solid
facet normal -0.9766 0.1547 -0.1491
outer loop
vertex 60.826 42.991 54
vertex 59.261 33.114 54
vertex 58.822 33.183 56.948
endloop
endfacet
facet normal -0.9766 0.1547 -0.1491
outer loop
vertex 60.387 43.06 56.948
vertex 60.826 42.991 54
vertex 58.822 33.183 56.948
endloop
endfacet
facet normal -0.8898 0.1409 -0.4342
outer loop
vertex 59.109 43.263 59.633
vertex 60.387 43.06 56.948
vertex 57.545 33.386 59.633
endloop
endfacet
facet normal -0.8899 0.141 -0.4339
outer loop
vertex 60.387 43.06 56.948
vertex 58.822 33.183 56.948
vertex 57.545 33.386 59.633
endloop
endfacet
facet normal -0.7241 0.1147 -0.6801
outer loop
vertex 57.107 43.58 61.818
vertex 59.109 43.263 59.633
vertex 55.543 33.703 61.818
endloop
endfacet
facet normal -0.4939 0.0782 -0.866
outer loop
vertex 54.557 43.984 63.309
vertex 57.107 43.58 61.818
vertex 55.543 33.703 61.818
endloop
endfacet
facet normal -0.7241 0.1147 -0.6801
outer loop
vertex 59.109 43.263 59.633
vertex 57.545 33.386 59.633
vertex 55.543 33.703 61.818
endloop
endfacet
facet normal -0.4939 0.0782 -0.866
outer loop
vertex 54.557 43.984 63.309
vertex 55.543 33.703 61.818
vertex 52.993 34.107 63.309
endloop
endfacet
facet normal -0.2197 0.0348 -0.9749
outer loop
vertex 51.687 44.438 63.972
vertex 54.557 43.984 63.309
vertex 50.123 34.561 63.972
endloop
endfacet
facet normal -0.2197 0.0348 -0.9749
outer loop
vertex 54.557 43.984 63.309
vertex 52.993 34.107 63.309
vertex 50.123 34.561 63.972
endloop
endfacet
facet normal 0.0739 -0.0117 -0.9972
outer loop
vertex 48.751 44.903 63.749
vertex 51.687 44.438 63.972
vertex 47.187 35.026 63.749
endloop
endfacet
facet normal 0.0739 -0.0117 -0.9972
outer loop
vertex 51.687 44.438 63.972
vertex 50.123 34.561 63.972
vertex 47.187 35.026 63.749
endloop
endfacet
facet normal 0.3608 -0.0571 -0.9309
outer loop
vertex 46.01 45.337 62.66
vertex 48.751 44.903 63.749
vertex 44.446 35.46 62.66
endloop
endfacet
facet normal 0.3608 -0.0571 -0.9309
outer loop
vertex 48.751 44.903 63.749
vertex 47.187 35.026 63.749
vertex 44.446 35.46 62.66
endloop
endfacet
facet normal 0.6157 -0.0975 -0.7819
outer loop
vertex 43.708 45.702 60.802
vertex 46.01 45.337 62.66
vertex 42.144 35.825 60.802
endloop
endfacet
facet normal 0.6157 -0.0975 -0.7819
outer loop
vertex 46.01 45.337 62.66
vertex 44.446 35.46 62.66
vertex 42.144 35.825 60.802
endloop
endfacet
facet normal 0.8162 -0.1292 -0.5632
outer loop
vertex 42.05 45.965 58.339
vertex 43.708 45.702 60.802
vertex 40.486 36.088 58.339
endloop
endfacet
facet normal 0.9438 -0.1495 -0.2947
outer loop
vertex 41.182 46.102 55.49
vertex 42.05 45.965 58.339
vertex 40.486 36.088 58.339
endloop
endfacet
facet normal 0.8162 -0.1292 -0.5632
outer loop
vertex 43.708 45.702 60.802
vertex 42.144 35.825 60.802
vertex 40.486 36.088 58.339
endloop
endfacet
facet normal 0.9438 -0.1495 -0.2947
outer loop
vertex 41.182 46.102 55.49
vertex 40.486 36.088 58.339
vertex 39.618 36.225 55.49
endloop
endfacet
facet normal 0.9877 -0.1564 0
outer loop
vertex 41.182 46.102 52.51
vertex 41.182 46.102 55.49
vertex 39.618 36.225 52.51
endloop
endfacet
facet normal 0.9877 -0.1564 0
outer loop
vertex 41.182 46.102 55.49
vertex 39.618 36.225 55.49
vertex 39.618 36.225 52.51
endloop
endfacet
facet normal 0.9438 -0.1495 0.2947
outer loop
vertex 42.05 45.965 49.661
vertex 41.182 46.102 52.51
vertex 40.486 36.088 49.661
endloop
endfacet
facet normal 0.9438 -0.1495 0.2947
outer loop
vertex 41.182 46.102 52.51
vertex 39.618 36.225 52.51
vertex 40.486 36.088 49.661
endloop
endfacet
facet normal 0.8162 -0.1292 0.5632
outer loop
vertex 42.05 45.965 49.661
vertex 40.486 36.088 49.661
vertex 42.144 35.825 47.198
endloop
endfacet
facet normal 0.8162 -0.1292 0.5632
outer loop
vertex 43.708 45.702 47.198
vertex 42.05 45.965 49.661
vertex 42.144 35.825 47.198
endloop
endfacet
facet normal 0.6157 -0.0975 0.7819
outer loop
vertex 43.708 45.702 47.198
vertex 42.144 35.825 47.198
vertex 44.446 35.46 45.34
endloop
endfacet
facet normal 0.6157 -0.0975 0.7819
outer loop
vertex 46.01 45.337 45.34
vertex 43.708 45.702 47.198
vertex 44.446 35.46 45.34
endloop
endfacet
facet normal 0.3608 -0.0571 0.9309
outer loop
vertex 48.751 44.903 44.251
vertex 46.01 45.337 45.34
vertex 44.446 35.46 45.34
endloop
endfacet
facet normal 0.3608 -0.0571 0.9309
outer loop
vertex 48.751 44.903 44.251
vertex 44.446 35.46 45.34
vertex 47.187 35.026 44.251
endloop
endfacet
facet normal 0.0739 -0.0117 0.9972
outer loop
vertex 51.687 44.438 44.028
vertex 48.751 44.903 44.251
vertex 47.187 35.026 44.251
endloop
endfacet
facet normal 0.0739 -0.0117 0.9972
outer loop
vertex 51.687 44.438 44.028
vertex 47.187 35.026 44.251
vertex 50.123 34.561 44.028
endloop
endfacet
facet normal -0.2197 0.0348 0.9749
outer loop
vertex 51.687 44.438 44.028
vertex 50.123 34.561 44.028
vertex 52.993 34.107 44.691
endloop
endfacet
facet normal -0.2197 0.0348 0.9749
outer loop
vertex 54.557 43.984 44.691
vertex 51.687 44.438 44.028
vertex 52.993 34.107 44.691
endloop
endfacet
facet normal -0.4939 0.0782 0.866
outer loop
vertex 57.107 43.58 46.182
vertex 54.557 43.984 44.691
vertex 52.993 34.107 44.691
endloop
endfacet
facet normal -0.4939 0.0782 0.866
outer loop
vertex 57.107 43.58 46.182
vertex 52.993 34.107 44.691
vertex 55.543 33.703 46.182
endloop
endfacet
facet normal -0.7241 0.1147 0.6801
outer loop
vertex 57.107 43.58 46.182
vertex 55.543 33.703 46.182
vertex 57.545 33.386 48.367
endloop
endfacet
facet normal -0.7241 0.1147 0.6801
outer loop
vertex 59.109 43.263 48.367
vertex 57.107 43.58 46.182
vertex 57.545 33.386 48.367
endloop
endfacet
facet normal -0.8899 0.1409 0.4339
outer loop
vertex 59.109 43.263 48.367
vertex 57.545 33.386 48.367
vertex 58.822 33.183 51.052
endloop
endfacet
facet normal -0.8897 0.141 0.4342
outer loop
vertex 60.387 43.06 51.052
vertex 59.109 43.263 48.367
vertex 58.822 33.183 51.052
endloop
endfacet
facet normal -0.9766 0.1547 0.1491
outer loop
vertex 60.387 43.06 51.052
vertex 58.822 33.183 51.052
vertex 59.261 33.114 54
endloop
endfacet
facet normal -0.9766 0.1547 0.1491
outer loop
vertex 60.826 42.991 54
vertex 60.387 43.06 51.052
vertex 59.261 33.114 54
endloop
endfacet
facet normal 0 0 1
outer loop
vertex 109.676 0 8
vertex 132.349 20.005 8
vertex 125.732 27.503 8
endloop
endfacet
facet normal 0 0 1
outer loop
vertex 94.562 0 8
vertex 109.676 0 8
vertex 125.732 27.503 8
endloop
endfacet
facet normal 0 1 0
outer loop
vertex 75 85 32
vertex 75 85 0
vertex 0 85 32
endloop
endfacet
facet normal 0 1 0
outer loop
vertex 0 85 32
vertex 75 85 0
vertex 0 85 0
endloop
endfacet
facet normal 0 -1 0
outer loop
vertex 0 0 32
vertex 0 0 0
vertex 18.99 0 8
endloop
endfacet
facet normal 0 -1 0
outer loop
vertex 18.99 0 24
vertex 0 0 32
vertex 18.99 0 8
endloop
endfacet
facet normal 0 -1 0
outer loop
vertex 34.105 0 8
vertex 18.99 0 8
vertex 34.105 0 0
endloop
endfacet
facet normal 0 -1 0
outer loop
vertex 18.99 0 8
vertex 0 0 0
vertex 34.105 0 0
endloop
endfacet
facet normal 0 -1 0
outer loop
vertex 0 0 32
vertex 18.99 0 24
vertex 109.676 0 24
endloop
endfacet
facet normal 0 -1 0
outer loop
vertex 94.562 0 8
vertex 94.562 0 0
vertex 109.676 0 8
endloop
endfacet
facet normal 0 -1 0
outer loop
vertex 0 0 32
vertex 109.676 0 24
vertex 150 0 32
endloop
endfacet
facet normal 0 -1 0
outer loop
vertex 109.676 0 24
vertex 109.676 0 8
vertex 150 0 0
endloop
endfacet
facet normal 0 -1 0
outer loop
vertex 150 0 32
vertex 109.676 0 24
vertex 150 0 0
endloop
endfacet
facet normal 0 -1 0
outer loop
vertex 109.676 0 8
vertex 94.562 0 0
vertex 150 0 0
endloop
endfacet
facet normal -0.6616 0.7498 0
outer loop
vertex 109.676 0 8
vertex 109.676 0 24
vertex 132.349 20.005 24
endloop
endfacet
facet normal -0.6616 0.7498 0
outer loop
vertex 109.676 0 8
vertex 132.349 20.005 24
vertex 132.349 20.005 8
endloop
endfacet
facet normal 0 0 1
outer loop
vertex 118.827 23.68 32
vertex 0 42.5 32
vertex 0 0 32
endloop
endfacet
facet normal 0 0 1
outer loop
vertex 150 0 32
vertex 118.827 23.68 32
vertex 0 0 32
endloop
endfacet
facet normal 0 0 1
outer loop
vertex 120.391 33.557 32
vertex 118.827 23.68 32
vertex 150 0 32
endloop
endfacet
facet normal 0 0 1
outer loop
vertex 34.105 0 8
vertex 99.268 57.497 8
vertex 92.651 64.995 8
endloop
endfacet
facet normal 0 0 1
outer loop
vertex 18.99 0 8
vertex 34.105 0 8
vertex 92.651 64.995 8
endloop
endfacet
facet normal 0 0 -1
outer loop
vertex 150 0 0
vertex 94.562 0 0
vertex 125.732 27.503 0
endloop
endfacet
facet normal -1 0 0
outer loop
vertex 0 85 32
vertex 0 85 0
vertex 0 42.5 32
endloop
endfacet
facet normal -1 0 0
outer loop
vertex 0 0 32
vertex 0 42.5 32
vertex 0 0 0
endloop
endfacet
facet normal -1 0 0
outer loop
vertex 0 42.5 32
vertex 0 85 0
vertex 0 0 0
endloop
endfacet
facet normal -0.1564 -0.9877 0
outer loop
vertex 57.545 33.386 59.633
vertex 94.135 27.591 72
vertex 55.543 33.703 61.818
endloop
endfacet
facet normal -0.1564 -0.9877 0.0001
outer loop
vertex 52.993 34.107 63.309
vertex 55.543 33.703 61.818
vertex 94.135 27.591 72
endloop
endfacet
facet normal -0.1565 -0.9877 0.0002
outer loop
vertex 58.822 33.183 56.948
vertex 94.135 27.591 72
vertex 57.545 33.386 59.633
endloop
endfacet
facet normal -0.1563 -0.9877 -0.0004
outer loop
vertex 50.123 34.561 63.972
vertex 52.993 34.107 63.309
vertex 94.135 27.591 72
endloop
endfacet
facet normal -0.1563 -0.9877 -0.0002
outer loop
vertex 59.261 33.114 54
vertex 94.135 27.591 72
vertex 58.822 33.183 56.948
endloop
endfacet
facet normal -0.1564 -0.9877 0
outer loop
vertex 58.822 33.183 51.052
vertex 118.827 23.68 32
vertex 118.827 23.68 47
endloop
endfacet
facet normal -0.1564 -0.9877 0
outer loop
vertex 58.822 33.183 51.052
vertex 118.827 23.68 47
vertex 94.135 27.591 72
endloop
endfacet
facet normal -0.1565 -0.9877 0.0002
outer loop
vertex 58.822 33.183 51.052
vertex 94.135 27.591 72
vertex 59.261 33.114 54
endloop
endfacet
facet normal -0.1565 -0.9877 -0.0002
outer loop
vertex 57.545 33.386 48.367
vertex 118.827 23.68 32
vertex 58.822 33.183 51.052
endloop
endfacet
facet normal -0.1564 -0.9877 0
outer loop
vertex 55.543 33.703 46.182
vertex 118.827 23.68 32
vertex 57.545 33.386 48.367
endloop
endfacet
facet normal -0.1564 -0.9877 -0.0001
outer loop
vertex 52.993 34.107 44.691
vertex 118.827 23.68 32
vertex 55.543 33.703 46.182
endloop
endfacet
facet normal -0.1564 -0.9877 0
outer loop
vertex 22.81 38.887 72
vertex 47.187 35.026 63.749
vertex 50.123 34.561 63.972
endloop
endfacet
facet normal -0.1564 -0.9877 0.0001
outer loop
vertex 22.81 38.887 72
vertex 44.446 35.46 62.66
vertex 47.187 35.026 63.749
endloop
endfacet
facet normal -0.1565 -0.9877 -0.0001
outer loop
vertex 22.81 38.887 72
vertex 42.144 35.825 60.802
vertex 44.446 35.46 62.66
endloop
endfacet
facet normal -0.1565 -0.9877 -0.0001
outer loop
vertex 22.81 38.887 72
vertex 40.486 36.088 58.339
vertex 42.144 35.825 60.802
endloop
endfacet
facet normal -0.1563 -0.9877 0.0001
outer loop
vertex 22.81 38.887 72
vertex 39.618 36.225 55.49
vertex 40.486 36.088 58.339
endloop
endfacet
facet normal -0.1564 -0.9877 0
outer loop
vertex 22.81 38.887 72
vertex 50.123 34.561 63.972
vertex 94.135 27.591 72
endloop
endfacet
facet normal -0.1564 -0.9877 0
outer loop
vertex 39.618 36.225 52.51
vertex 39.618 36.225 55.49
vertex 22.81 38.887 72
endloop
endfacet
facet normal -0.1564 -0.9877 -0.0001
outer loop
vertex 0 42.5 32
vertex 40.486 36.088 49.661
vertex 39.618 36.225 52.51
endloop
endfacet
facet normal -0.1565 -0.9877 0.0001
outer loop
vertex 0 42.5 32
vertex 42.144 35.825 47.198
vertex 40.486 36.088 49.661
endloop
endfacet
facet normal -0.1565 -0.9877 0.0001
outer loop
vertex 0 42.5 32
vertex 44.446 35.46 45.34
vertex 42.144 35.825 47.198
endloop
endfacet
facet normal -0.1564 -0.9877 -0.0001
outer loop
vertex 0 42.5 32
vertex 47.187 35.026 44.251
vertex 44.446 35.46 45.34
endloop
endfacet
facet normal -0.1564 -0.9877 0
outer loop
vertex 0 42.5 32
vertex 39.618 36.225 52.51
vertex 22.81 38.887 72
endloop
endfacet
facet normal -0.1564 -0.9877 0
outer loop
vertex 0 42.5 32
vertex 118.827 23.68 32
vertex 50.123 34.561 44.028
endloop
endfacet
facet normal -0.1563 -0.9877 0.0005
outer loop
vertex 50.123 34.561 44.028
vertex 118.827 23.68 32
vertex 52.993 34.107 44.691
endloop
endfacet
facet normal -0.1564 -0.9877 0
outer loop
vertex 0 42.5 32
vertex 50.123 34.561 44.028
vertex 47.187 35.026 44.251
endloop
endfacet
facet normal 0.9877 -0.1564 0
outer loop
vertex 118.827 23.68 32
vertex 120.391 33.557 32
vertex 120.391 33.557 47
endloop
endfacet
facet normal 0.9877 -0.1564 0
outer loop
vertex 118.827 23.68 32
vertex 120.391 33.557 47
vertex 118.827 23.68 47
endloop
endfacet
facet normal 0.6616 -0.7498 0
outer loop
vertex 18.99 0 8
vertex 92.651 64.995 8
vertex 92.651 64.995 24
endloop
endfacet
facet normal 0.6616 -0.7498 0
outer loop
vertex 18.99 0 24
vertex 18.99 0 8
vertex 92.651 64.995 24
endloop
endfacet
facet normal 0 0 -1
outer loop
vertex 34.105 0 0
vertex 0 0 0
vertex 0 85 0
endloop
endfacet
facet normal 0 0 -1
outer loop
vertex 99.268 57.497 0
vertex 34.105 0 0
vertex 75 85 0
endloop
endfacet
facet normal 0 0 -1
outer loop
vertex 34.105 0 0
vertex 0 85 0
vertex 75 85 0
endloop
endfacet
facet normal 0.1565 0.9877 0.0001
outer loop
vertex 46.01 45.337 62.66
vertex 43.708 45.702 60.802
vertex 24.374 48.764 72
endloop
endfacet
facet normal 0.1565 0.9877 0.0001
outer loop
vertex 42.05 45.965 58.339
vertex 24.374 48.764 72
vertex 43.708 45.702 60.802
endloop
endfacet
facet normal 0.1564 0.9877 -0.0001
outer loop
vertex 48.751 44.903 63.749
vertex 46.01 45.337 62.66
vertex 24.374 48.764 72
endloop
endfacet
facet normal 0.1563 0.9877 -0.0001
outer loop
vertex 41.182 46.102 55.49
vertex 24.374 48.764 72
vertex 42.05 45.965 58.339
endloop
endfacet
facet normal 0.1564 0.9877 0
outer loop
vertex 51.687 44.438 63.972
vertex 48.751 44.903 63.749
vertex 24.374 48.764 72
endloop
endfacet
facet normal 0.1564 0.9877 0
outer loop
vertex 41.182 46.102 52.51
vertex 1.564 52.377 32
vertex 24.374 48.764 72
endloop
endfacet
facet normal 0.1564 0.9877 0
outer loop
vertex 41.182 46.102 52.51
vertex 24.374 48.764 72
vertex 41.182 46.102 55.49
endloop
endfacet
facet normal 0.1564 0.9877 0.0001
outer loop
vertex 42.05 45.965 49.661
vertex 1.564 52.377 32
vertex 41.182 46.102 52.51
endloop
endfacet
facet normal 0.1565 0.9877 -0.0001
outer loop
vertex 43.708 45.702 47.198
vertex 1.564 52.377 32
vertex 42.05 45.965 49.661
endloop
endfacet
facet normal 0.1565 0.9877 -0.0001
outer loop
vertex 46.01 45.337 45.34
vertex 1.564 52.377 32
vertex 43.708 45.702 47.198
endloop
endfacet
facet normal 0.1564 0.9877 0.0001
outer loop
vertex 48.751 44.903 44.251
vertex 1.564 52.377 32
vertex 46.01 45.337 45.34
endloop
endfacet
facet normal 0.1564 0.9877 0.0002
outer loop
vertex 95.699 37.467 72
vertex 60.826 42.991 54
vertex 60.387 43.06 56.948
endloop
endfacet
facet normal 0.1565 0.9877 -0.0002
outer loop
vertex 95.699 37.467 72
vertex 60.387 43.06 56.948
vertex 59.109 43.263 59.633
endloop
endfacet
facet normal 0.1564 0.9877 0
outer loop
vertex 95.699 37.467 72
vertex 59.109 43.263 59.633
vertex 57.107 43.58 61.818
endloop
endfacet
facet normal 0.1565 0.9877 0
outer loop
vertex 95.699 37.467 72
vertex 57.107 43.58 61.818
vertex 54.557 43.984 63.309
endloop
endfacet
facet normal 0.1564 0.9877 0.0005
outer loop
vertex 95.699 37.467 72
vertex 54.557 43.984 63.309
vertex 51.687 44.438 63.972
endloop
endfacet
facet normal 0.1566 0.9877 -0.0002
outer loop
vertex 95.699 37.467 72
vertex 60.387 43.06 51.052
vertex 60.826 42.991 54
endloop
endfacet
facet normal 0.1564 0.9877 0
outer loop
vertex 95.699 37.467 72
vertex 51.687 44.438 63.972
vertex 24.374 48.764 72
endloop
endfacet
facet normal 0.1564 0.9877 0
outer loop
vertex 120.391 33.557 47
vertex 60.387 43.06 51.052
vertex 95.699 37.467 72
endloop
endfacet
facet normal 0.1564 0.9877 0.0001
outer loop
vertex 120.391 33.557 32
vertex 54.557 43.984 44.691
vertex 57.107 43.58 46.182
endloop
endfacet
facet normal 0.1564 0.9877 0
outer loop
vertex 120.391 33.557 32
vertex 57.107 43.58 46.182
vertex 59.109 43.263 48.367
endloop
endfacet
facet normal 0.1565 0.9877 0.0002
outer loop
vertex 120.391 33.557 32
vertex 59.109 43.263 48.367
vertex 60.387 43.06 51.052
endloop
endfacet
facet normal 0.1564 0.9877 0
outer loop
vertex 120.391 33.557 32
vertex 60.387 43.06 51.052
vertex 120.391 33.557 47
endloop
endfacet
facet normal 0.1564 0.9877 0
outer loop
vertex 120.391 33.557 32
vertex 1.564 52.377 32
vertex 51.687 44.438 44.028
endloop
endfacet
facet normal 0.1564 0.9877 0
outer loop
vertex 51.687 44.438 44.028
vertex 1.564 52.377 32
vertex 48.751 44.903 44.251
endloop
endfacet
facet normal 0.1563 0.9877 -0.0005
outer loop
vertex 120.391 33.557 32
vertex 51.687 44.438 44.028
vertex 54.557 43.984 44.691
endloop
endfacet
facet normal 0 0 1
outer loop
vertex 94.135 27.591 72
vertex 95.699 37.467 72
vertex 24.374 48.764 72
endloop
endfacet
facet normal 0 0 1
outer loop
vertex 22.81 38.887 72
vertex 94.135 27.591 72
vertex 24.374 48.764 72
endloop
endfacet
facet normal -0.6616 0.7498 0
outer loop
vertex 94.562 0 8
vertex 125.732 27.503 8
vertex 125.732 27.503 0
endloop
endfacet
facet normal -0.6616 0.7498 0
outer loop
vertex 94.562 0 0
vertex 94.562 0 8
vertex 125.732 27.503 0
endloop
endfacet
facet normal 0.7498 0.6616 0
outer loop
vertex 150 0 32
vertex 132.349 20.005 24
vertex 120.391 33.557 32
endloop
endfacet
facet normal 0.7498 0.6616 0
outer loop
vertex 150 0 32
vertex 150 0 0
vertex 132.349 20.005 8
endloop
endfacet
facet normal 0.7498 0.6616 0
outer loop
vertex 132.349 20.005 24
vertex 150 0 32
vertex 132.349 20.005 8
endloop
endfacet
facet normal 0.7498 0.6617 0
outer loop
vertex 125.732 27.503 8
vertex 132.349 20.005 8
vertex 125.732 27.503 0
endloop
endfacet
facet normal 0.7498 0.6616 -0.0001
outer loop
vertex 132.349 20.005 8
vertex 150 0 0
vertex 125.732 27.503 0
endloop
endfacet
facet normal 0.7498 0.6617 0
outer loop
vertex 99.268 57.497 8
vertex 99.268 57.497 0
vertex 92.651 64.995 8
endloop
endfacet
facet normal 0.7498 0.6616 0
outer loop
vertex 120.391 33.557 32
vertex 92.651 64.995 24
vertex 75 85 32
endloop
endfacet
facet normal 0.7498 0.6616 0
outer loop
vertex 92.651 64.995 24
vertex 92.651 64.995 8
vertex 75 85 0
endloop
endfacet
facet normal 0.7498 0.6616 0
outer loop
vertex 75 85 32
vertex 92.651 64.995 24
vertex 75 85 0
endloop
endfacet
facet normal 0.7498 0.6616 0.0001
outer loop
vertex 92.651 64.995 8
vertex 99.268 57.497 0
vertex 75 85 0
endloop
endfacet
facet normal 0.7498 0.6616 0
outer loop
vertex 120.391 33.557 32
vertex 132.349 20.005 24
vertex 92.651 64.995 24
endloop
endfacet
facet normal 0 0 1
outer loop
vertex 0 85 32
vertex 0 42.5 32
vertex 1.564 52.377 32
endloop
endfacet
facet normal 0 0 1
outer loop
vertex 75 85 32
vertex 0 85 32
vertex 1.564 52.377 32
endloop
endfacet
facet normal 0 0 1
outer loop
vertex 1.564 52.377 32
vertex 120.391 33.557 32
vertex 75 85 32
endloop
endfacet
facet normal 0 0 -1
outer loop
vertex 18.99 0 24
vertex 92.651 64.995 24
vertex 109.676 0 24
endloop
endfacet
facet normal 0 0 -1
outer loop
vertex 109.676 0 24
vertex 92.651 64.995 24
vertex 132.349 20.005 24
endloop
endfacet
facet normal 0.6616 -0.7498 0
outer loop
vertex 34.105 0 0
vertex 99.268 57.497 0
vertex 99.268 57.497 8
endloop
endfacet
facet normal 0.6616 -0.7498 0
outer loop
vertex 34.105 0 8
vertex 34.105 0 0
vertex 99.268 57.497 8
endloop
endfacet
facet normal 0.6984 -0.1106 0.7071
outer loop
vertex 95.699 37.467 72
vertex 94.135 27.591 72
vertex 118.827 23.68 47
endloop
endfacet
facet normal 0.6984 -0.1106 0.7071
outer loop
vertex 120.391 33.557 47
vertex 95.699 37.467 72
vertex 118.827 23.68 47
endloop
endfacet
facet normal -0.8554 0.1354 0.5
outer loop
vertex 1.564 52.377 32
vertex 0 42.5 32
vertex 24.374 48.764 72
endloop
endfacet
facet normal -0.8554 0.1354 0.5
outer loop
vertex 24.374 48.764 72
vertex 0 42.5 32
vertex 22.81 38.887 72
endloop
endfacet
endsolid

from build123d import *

# Parameters (mm, degrees)
BOSS_EXTRUDE1_DEPTH   = 32
BOSS_EXTRUDE1_2_DEPTH = 32
BOSS_EXTRUDE2_DEPTH   = 72
CUT_EXTRUDE1_REACH    = 135.547
CUT_EXTRUDE2_REACH    = 168.292
SKETCH3_R             = 10


with BuildPart() as part:
    # Sketch1 → Boss-Extrude1 (new body)
    with BuildSketch(Plane.XY):
        Polygon((0, 42.5), (1.56434465, 52.376883406), (120.39128367, 33.556545174), (75, 85), (0, 85), align=None)
    extrude(amount=BOSS_EXTRUDE1_DEPTH)



with BuildPart() as body_2:
    # Sketch1 → Boss-Extrude1 2 (new body)
    with BuildSketch(Plane.XY):
        Polygon((150, 0), (120.39128367, 33.556545174), (118.82693902, 23.679661768), (0, 42.5), (0, 0), align=None)
    extrude(amount=BOSS_EXTRUDE1_2_DEPTH)


with BuildPart() as part_1:
    add(part.part)

    add(body_2.part)  # Boss-Extrude2 merges body 2
    # Sketch1<4> → Boss-Extrude2 (add)
    with BuildSketch(Plane.XY):
        Polygon((0, 42.5), (1.56434465, 52.376883406), (120.39128367, 33.556545174), (118.82693902, 23.679661768), align=None)
    extrude(amount=BOSS_EXTRUDE2_DEPTH)

    # Cut-Extrude1: up to this plane
    cut_extrude1_end = Plane(origin=(0, 0, 32), z_dir=(0, 1, 0))
    # Sketch2 → Cut-Extrude1 (cut, up to the surface)
    with BuildSketch(Plane(origin=(84.338521401, 74.416342412, 0), x_dir=(0, 0, -1), z_dir=(0.7498378553650925, 0.6616216370868464, 0)), mode=Mode.PRIVATE) as cut_extrude1_sk1:
        Polygon((0, -22.564325319), (-8, -22.564325319), (-8, -12.564325319), (-24, -12.564325319), (-24, -72.564325319), (-8, -72.564325319), (-8, -62.564325319), (0, -62.564325319), align=None)
    cut_extrude1_tool1 = split(extrude(cut_extrude1_sk1.sketch, amount=-CUT_EXTRUDE1_REACH, mode=Mode.PRIVATE), bisect_by=cut_extrude1_end, keep=Keep.BOTH, mode=Mode.PRIVATE)
    add(cut_extrude1_tool1.solids().sort_by_distance((112.5, 42.5, 13))[0], mode=Mode.SUBTRACT)

    # Sketch3 → Cut-Extrude2 (cut, up to next)
    with BuildSketch(Plane(origin=(6.56661113, 41.459950971, 0), x_dir=(0.9876883405951378, -0.1564344650402311, 0), z_dir=(-0.1564344650402311, -0.9876883405951378, 0)), mode=Mode.PRIVATE) as cut_extrude2_sk1:
        with Locations((43.351535236, 54)):
            Circle(SKETCH3_R)
    cut_extrude2_tool1 = extrude(cut_extrude2_sk1.sketch, amount=-CUT_EXTRUDE2_REACH, mode=Mode.PRIVATE) & part_1.part
    # Sketch3 → Cut-Extrude2 (cut, up to next)
    with BuildSketch(Plane(origin=(6.56661113, 41.459950971, 0), x_dir=(0.9876883405951378, -0.1564344650402311, 0), z_dir=(-0.1564344650402311, -0.9876883405951378, 0)), mode=Mode.PRIVATE) as cut_extrude2_sk2:
        Polygon((113.659666997, 72), (88.659666997, 72), (113.659666997, 47), align=None)
    cut_extrude2_tool2 = extrude(cut_extrude2_sk2.sketch, amount=-CUT_EXTRUDE2_REACH, mode=Mode.PRIVATE) & part_1.part
    # Sketch3 → Cut-Extrude2 (cut, up to next)
    with BuildSketch(Plane(origin=(6.56661113, 41.459950971, 0), x_dir=(0.9876883405951378, -0.1564344650402311, 0), z_dir=(-0.1564344650402311, -0.9876883405951378, 0)), mode=Mode.PRIVATE) as cut_extrude2_sk3:
        Polygon((-6.648464764, 72), (-6.648464764, 32), (16.445546003, 72), align=None)
    cut_extrude2_tool3 = extrude(cut_extrude2_sk3.sketch, amount=-CUT_EXTRUDE2_REACH, mode=Mode.PRIVATE) & part_1.part
    add(cut_extrude2_tool1.solids().sort_by_distance((49.384417, 34.678277, 54))[0], mode=Mode.SUBTRACT)
    add(cut_extrude2_tool2.solids().sort_by_distance((110.596203, 24.983282, 63.666667))[0], mode=Mode.SUBTRACT)
    add(cut_extrude2_tool3.solids().sort_by_distance((7.603228, 41.295767, 58.666667))[0], mode=Mode.SUBTRACT)


solid = part_1.part
